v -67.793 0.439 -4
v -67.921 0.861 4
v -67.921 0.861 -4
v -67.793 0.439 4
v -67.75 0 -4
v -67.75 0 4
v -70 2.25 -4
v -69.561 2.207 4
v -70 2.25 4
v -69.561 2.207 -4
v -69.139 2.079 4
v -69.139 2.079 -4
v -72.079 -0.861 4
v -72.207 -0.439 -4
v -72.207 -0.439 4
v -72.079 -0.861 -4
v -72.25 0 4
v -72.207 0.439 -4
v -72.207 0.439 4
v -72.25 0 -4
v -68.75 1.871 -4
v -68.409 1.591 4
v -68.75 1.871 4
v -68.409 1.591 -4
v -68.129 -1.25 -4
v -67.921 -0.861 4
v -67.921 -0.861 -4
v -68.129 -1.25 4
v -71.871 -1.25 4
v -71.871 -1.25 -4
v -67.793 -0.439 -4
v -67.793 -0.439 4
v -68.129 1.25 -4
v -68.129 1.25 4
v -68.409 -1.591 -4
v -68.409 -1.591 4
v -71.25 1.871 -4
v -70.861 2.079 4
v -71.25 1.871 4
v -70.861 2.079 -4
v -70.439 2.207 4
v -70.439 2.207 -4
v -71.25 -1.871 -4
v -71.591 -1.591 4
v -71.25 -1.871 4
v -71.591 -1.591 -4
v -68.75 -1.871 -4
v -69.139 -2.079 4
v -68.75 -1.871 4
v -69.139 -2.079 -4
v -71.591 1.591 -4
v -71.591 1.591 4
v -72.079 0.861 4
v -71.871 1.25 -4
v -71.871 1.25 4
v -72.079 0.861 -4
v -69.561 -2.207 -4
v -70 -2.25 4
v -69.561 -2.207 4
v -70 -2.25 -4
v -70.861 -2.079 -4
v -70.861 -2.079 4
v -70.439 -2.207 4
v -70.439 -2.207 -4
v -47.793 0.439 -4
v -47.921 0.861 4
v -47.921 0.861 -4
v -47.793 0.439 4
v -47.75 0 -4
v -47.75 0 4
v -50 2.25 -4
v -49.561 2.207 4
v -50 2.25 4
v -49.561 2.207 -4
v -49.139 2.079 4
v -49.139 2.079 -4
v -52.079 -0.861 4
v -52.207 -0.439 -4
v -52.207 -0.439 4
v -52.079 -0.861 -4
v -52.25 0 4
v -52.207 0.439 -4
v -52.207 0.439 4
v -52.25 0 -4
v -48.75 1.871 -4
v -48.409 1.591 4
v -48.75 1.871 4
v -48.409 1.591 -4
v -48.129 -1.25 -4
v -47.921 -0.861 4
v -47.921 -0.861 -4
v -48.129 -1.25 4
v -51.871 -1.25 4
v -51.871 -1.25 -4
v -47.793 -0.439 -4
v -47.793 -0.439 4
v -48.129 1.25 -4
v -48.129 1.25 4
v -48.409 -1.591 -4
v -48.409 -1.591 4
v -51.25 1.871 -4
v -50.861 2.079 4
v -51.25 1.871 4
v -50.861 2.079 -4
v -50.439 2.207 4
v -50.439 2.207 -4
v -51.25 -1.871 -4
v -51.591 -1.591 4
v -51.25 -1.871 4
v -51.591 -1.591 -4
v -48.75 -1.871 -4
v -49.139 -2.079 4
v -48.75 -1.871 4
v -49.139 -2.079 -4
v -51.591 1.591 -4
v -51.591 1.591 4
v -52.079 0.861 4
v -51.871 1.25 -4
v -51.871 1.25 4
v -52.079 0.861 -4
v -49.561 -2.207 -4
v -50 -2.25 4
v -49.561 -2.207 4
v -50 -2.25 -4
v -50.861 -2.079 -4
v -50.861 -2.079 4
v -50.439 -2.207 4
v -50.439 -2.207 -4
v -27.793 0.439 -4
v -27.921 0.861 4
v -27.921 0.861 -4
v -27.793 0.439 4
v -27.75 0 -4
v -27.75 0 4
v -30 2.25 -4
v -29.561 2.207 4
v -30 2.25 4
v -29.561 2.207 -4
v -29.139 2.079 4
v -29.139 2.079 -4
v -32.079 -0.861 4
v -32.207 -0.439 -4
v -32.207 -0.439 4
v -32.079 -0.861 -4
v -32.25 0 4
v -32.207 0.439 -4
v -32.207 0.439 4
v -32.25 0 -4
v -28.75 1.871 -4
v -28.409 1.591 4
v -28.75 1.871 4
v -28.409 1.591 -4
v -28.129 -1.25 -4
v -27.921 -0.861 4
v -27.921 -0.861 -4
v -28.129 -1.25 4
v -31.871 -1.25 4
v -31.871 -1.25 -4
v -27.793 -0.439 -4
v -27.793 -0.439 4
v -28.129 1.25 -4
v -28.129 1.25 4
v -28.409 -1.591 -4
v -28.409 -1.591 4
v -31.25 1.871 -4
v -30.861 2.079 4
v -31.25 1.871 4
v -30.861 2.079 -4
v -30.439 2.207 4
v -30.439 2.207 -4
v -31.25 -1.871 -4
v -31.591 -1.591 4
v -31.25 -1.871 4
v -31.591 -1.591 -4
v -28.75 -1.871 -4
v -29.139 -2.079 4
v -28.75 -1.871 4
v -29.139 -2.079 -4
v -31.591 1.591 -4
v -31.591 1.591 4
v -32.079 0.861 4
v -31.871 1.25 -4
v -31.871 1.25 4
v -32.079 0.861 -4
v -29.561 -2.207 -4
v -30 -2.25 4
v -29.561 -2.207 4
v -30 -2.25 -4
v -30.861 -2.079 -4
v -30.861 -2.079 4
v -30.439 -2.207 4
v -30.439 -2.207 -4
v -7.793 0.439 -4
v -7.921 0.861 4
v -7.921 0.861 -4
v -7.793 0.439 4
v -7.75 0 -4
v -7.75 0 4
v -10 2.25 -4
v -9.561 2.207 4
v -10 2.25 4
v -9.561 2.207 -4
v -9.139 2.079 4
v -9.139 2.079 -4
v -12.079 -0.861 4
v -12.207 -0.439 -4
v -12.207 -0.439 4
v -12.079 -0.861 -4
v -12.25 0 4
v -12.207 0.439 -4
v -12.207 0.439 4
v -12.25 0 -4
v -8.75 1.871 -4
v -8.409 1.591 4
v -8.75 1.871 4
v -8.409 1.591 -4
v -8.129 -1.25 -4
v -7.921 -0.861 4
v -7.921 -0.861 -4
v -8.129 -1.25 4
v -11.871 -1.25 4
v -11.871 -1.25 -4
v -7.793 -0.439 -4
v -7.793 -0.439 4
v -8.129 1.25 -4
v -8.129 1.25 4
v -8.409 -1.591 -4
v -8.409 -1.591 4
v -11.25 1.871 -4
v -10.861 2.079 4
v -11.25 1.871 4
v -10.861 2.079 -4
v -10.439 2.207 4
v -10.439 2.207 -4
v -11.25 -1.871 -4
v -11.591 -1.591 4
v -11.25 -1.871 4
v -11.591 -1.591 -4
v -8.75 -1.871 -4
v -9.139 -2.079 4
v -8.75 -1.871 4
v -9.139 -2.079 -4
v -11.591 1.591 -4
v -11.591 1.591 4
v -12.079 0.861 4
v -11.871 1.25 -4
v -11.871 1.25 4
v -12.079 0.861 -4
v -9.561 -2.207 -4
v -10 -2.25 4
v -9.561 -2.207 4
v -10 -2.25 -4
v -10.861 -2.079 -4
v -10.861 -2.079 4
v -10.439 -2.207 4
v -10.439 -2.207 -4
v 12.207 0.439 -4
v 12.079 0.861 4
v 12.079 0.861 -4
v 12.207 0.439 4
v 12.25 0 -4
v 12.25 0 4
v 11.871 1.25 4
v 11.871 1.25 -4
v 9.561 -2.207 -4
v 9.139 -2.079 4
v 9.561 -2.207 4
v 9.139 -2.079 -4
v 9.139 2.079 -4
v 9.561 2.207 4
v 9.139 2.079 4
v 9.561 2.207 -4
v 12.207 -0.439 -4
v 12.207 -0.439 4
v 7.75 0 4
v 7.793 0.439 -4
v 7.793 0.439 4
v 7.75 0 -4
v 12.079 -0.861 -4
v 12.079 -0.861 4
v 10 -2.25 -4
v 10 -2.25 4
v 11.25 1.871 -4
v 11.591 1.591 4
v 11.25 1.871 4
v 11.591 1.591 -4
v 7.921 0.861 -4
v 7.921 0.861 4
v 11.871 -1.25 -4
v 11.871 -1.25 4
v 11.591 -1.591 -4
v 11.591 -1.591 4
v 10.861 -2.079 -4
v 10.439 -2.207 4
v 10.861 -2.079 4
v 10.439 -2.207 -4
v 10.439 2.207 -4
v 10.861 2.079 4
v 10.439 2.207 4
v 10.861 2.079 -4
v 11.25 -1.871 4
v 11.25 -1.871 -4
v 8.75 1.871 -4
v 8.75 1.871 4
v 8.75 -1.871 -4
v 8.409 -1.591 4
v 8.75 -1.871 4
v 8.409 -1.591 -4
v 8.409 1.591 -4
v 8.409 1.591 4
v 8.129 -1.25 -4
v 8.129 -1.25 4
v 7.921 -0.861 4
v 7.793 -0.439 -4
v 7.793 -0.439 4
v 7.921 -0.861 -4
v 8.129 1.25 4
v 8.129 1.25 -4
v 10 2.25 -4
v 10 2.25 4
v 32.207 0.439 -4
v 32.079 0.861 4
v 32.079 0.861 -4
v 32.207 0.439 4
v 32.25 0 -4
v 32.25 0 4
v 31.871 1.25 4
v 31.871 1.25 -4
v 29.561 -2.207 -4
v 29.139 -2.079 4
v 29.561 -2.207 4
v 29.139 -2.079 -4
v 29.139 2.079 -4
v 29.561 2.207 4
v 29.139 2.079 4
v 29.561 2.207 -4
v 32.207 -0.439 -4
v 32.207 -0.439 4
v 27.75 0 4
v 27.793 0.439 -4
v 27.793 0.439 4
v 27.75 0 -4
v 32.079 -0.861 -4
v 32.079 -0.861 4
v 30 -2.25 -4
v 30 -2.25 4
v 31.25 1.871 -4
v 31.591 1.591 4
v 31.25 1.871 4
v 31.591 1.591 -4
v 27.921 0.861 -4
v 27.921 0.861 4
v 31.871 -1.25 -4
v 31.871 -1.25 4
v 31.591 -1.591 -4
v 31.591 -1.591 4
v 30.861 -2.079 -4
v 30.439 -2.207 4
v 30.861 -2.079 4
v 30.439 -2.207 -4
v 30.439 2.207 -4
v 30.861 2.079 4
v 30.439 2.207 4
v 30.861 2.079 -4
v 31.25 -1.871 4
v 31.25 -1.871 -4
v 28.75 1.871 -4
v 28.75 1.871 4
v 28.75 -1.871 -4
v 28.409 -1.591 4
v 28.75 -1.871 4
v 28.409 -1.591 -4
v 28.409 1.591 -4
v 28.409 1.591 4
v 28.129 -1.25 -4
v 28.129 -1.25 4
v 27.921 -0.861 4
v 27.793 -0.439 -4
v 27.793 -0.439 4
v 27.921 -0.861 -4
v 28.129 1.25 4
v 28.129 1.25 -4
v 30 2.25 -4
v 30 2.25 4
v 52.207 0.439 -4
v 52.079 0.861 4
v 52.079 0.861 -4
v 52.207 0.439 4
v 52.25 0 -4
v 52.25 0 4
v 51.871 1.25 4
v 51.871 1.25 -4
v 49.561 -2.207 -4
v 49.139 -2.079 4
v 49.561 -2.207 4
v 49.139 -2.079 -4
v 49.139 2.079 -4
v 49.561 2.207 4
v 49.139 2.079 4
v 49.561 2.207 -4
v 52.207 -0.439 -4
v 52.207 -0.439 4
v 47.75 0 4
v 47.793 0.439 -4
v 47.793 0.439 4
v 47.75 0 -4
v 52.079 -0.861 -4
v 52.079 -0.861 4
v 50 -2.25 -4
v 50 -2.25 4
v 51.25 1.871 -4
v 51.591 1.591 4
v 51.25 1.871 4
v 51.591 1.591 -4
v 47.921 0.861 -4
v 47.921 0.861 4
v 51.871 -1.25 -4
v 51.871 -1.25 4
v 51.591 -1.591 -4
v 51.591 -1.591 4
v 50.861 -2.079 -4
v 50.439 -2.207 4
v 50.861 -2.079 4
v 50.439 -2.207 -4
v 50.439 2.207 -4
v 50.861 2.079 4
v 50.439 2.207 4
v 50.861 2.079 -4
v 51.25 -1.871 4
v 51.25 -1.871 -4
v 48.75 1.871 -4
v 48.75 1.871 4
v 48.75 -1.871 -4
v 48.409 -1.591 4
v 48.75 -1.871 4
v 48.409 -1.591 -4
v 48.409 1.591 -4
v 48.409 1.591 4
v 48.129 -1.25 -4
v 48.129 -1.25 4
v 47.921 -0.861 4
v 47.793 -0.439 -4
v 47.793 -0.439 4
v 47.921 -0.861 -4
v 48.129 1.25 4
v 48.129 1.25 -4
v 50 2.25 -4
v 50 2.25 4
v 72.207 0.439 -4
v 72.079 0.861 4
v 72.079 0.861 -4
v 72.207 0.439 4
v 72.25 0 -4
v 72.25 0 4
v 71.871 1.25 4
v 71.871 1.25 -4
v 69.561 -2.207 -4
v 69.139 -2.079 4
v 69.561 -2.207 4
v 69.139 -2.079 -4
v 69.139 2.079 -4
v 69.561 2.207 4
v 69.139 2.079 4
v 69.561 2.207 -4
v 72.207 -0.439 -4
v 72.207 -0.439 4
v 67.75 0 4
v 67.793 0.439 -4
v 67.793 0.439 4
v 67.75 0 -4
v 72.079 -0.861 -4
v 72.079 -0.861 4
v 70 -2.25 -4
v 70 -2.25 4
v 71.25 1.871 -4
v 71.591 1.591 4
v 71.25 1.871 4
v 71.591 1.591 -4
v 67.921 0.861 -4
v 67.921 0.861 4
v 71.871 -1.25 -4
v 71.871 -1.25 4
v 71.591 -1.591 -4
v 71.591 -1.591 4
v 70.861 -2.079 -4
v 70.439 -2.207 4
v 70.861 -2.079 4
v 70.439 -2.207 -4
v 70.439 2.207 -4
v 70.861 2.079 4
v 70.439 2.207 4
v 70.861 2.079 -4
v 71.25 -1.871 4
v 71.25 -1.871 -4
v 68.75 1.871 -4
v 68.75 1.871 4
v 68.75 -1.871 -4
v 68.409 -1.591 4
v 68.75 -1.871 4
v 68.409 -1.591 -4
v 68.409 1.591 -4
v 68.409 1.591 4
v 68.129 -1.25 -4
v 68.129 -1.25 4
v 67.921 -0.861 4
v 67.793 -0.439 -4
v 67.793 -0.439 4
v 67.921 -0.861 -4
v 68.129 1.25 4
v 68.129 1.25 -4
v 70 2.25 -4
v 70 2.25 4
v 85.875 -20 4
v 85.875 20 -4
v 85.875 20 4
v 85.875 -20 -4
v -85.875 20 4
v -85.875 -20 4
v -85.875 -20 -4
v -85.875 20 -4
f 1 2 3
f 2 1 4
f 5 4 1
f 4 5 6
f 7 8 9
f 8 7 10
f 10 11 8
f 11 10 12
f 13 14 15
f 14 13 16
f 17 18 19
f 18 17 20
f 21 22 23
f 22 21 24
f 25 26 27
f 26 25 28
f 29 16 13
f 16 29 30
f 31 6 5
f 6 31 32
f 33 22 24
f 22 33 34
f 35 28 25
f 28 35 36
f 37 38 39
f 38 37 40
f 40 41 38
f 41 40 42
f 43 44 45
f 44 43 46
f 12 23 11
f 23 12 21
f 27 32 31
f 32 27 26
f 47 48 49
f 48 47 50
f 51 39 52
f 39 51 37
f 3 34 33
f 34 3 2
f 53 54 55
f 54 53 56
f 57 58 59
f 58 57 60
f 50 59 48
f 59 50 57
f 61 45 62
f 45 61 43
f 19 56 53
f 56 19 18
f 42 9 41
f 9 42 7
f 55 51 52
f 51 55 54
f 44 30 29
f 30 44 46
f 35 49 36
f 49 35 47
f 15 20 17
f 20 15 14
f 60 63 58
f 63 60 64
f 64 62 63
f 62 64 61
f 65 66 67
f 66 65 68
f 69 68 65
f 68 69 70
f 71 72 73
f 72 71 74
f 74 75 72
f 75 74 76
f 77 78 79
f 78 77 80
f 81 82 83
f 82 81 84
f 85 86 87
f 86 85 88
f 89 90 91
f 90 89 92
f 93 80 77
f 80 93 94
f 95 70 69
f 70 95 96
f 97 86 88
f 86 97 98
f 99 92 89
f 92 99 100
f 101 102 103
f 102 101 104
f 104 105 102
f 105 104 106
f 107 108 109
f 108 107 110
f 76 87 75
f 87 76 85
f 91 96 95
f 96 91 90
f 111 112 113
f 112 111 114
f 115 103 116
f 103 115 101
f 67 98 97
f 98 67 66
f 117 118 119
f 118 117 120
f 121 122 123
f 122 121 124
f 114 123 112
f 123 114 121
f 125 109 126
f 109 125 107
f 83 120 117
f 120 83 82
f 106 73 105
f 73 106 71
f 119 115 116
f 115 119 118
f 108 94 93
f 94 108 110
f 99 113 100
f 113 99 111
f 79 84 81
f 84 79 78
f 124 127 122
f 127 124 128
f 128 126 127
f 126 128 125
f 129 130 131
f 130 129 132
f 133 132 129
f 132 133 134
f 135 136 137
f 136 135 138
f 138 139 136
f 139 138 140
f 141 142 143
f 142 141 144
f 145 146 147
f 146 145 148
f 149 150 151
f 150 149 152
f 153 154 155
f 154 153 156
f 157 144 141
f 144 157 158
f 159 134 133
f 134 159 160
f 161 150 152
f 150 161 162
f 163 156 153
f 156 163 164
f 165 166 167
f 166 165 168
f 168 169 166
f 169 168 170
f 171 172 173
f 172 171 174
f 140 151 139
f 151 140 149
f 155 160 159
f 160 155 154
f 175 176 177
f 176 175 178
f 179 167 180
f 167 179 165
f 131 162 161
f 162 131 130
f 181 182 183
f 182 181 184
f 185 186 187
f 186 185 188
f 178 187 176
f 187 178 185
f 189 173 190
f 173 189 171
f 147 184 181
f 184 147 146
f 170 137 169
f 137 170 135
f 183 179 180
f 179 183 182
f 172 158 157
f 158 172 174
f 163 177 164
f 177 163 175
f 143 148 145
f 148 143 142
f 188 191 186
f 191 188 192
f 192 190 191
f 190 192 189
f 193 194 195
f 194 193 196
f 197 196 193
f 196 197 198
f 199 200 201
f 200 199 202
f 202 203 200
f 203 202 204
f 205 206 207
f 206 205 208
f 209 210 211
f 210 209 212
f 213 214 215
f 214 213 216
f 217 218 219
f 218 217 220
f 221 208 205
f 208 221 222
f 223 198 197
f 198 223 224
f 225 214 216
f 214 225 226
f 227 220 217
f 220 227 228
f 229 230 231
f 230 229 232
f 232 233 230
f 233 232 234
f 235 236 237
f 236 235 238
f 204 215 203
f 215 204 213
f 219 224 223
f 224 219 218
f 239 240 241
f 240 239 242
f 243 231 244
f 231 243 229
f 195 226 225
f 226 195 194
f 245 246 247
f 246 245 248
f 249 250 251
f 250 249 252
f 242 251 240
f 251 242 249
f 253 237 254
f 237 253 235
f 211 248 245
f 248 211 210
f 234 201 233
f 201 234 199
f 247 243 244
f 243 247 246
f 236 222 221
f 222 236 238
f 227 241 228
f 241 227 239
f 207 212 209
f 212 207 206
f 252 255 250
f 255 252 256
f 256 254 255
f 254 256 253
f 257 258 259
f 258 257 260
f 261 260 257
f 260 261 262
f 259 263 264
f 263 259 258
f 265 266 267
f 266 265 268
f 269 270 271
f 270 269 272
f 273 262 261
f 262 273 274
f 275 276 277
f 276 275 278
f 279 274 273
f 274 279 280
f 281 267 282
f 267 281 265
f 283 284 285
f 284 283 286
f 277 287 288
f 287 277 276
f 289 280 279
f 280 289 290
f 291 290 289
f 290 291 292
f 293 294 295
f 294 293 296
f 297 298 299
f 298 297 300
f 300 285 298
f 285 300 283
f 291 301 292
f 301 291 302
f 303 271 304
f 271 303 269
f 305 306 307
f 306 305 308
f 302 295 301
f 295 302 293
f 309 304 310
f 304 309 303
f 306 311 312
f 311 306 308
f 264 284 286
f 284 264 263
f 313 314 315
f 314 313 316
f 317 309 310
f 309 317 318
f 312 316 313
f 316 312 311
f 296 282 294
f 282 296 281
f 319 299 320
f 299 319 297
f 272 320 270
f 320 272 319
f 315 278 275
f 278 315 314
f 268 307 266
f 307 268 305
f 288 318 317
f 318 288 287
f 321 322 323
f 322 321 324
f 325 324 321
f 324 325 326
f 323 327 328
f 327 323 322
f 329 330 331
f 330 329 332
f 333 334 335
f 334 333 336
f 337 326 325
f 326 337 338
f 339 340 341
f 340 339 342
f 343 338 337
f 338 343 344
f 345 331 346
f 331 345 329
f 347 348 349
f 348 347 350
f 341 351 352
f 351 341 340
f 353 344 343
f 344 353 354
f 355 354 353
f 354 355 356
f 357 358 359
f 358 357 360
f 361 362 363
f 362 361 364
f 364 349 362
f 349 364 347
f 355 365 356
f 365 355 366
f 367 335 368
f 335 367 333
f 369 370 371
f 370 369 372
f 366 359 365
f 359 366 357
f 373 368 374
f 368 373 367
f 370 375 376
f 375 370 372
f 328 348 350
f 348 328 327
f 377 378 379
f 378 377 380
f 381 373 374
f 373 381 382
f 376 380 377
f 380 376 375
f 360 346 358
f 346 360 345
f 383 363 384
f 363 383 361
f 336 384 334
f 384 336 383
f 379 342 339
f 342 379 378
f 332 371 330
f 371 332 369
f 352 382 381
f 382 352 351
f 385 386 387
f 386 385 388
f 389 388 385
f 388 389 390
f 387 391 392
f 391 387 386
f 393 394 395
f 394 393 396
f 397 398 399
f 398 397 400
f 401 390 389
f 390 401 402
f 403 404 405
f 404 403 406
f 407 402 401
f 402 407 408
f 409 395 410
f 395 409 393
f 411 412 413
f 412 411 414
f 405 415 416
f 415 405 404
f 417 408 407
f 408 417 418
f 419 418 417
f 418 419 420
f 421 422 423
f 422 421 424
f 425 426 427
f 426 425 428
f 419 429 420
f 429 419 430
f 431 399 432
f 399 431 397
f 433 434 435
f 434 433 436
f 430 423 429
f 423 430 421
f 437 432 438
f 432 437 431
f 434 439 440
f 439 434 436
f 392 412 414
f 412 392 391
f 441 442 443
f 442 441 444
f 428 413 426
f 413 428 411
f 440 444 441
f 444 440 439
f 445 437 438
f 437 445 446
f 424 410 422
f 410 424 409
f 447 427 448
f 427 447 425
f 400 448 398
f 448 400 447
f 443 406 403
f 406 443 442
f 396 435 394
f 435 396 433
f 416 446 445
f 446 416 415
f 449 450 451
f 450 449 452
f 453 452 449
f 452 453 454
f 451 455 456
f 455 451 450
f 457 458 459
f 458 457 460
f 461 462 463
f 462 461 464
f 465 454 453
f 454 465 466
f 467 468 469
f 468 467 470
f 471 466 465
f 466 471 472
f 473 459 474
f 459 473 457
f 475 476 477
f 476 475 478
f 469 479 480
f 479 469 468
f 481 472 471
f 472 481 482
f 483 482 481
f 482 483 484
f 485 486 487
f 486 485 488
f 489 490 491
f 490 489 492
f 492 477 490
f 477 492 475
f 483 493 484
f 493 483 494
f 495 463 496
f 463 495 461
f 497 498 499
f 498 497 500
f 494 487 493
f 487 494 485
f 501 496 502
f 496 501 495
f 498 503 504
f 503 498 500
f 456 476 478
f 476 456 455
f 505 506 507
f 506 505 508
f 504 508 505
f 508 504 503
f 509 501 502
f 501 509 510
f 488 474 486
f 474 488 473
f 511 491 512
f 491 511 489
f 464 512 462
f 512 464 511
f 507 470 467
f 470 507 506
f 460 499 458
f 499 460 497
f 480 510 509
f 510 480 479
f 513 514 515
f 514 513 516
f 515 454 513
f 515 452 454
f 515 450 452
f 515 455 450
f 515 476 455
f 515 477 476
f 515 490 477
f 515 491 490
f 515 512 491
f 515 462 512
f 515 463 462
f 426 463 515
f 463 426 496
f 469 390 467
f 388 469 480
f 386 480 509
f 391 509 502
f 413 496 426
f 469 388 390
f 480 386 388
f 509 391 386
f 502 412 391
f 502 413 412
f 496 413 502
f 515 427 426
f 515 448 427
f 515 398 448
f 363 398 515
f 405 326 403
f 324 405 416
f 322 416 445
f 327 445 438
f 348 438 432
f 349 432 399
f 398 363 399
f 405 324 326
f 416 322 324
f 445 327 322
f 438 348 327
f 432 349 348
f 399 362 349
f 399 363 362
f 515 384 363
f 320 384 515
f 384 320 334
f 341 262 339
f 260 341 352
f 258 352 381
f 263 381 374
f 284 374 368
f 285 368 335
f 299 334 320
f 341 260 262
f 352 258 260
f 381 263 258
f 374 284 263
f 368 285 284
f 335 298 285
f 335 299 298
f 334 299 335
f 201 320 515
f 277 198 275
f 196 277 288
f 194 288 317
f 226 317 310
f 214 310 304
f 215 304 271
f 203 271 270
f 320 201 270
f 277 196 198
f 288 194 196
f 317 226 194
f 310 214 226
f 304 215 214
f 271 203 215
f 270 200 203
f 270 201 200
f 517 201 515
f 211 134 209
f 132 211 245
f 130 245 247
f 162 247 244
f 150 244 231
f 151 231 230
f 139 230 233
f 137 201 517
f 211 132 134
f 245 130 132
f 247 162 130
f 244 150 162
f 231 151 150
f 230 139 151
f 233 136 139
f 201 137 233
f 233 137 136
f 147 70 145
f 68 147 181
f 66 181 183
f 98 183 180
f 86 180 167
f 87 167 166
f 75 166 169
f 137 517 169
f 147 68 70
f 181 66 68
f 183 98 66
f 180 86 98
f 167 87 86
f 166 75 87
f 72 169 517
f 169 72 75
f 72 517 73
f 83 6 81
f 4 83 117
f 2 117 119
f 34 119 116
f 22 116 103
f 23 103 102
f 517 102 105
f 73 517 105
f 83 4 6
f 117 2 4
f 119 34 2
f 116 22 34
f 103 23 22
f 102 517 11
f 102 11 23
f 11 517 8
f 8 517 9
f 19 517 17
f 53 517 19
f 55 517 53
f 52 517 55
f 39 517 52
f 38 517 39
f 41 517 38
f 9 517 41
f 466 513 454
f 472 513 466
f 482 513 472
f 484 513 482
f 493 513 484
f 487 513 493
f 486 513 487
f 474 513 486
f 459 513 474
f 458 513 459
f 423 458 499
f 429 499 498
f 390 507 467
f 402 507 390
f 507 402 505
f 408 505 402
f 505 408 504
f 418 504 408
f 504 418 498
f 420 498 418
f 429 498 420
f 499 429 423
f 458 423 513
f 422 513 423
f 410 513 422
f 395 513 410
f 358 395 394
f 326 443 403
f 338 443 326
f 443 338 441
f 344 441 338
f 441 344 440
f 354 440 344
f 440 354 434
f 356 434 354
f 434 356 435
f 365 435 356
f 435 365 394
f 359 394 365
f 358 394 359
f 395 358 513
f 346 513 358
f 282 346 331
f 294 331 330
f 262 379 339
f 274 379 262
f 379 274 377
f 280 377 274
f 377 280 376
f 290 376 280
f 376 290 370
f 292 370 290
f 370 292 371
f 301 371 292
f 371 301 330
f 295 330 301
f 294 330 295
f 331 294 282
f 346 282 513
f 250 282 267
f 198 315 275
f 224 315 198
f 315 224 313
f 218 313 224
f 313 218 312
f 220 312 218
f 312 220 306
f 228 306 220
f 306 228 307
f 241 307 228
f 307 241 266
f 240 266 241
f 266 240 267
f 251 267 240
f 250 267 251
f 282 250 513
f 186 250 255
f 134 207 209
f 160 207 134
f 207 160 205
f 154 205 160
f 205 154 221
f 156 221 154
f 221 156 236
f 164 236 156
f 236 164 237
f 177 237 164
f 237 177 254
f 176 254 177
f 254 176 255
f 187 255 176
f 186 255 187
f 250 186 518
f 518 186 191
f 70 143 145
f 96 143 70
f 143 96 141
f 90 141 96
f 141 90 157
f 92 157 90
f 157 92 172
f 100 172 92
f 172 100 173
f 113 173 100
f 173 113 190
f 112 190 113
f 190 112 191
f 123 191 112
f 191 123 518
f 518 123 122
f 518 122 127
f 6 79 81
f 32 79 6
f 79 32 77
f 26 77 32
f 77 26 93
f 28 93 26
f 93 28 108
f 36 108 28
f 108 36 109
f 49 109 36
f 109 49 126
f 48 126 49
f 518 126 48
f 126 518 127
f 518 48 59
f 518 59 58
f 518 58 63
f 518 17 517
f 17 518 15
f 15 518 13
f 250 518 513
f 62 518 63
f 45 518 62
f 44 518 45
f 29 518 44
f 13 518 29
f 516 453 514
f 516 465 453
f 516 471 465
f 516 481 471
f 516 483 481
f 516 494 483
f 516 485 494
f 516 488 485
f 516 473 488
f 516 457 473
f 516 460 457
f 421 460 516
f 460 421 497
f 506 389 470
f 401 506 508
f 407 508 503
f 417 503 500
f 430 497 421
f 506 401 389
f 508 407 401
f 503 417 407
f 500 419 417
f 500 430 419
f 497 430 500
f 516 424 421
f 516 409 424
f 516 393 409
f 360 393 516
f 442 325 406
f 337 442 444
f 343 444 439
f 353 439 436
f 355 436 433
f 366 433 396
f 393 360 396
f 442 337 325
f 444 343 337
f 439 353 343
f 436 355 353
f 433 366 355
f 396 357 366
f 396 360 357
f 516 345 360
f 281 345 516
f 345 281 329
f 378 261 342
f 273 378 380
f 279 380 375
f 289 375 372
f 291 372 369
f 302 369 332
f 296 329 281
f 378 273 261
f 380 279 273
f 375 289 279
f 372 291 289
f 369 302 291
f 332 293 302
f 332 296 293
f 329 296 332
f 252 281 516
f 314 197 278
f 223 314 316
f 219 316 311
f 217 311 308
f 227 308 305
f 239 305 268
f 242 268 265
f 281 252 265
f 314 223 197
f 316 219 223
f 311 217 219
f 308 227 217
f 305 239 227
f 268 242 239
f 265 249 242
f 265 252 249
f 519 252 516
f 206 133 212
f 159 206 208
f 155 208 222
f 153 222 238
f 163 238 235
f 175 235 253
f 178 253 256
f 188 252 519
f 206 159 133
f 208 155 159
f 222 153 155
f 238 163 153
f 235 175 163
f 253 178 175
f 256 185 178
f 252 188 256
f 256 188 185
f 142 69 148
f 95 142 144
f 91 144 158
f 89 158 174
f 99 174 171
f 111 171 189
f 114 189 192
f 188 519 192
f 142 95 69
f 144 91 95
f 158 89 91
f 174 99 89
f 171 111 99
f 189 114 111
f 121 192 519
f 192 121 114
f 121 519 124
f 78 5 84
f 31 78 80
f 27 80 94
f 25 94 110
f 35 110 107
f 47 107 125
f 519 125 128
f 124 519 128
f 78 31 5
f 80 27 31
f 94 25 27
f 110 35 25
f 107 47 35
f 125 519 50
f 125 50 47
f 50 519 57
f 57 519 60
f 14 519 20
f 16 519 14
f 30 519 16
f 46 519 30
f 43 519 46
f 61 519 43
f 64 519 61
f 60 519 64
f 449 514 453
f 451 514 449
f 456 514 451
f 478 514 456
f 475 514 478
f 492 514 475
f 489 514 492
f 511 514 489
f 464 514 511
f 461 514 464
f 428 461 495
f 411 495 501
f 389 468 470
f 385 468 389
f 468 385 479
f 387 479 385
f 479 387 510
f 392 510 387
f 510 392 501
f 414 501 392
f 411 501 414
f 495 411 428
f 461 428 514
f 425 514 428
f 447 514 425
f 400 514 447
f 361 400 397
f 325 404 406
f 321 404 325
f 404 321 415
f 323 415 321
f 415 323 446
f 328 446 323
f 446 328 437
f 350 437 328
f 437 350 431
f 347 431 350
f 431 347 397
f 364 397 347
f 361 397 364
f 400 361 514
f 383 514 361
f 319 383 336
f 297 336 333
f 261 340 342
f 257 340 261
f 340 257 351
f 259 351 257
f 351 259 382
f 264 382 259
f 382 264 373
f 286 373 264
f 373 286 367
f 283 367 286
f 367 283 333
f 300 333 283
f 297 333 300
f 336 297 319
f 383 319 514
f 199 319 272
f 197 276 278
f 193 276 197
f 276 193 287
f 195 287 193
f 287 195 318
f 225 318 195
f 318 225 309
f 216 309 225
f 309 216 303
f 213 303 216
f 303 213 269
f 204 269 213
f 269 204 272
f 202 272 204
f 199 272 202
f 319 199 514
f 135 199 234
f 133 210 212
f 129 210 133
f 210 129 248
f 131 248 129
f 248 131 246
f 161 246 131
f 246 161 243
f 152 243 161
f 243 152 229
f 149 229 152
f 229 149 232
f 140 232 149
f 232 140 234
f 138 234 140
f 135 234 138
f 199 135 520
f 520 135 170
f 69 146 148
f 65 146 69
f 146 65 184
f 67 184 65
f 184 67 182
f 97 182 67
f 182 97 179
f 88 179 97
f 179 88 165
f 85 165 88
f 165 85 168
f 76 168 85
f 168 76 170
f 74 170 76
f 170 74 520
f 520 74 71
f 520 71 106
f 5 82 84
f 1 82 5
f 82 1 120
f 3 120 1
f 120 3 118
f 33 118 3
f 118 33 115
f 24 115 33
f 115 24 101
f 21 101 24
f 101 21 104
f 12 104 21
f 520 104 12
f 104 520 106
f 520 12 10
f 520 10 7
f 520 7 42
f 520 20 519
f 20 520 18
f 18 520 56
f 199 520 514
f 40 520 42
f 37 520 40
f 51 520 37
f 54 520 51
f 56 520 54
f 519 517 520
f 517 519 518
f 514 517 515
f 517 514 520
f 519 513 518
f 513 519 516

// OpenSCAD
$fn = 32;

// ----------------------------------------------------------------------
// Hole bar, 8 x Ø4.5
// row layout, 15.875 mm edge offset
// ----------------------------------------------------------------------

// --- parameters (mm) ---
bar_w = 40;     // bar width (Y)
bar_t = 8;      // bar thickness (Z)
holes = 8;      // holes per row
hole_d = 4.5;   // hole diameter
edge = 15.875;  // offset from the bar end to the first hole
pitch = 20;     // pitch between neighbouring holes

// --- derived feature positions (mm) ---
span = (holes - 1) * pitch;   // = 140   distance between the end holes
bar_l = span + 2 * edge;      // = 171.75   overall bar length
start_x = -bar_l / 2 + edge;  // = -70   X of the first hole
feature_centers = [
  [start_x + 0 * pitch, 0],
  [start_x + 1 * pitch, 0],
  [start_x + 2 * pitch, 0],
  [start_x + 3 * pitch, 0],
  [start_x + 4 * pitch, 0],
  [start_x + 5 * pitch, 0],
  [start_x + 6 * pitch, 0],
  [start_x + 7 * pitch, 0]
];   // hole centres of the first row

// bar with one row of holes, drilled from feature_centers
difference() {
  translate([-bar_l / 2, -bar_w / 2, -bar_t / 2]) cube([bar_l, bar_w, bar_t]);
  for (centre = feature_centers)
    translate([centre[0], centre[1], 0])
      cylinder(d = hole_d, h = bar_t + 2, center = true);
}
